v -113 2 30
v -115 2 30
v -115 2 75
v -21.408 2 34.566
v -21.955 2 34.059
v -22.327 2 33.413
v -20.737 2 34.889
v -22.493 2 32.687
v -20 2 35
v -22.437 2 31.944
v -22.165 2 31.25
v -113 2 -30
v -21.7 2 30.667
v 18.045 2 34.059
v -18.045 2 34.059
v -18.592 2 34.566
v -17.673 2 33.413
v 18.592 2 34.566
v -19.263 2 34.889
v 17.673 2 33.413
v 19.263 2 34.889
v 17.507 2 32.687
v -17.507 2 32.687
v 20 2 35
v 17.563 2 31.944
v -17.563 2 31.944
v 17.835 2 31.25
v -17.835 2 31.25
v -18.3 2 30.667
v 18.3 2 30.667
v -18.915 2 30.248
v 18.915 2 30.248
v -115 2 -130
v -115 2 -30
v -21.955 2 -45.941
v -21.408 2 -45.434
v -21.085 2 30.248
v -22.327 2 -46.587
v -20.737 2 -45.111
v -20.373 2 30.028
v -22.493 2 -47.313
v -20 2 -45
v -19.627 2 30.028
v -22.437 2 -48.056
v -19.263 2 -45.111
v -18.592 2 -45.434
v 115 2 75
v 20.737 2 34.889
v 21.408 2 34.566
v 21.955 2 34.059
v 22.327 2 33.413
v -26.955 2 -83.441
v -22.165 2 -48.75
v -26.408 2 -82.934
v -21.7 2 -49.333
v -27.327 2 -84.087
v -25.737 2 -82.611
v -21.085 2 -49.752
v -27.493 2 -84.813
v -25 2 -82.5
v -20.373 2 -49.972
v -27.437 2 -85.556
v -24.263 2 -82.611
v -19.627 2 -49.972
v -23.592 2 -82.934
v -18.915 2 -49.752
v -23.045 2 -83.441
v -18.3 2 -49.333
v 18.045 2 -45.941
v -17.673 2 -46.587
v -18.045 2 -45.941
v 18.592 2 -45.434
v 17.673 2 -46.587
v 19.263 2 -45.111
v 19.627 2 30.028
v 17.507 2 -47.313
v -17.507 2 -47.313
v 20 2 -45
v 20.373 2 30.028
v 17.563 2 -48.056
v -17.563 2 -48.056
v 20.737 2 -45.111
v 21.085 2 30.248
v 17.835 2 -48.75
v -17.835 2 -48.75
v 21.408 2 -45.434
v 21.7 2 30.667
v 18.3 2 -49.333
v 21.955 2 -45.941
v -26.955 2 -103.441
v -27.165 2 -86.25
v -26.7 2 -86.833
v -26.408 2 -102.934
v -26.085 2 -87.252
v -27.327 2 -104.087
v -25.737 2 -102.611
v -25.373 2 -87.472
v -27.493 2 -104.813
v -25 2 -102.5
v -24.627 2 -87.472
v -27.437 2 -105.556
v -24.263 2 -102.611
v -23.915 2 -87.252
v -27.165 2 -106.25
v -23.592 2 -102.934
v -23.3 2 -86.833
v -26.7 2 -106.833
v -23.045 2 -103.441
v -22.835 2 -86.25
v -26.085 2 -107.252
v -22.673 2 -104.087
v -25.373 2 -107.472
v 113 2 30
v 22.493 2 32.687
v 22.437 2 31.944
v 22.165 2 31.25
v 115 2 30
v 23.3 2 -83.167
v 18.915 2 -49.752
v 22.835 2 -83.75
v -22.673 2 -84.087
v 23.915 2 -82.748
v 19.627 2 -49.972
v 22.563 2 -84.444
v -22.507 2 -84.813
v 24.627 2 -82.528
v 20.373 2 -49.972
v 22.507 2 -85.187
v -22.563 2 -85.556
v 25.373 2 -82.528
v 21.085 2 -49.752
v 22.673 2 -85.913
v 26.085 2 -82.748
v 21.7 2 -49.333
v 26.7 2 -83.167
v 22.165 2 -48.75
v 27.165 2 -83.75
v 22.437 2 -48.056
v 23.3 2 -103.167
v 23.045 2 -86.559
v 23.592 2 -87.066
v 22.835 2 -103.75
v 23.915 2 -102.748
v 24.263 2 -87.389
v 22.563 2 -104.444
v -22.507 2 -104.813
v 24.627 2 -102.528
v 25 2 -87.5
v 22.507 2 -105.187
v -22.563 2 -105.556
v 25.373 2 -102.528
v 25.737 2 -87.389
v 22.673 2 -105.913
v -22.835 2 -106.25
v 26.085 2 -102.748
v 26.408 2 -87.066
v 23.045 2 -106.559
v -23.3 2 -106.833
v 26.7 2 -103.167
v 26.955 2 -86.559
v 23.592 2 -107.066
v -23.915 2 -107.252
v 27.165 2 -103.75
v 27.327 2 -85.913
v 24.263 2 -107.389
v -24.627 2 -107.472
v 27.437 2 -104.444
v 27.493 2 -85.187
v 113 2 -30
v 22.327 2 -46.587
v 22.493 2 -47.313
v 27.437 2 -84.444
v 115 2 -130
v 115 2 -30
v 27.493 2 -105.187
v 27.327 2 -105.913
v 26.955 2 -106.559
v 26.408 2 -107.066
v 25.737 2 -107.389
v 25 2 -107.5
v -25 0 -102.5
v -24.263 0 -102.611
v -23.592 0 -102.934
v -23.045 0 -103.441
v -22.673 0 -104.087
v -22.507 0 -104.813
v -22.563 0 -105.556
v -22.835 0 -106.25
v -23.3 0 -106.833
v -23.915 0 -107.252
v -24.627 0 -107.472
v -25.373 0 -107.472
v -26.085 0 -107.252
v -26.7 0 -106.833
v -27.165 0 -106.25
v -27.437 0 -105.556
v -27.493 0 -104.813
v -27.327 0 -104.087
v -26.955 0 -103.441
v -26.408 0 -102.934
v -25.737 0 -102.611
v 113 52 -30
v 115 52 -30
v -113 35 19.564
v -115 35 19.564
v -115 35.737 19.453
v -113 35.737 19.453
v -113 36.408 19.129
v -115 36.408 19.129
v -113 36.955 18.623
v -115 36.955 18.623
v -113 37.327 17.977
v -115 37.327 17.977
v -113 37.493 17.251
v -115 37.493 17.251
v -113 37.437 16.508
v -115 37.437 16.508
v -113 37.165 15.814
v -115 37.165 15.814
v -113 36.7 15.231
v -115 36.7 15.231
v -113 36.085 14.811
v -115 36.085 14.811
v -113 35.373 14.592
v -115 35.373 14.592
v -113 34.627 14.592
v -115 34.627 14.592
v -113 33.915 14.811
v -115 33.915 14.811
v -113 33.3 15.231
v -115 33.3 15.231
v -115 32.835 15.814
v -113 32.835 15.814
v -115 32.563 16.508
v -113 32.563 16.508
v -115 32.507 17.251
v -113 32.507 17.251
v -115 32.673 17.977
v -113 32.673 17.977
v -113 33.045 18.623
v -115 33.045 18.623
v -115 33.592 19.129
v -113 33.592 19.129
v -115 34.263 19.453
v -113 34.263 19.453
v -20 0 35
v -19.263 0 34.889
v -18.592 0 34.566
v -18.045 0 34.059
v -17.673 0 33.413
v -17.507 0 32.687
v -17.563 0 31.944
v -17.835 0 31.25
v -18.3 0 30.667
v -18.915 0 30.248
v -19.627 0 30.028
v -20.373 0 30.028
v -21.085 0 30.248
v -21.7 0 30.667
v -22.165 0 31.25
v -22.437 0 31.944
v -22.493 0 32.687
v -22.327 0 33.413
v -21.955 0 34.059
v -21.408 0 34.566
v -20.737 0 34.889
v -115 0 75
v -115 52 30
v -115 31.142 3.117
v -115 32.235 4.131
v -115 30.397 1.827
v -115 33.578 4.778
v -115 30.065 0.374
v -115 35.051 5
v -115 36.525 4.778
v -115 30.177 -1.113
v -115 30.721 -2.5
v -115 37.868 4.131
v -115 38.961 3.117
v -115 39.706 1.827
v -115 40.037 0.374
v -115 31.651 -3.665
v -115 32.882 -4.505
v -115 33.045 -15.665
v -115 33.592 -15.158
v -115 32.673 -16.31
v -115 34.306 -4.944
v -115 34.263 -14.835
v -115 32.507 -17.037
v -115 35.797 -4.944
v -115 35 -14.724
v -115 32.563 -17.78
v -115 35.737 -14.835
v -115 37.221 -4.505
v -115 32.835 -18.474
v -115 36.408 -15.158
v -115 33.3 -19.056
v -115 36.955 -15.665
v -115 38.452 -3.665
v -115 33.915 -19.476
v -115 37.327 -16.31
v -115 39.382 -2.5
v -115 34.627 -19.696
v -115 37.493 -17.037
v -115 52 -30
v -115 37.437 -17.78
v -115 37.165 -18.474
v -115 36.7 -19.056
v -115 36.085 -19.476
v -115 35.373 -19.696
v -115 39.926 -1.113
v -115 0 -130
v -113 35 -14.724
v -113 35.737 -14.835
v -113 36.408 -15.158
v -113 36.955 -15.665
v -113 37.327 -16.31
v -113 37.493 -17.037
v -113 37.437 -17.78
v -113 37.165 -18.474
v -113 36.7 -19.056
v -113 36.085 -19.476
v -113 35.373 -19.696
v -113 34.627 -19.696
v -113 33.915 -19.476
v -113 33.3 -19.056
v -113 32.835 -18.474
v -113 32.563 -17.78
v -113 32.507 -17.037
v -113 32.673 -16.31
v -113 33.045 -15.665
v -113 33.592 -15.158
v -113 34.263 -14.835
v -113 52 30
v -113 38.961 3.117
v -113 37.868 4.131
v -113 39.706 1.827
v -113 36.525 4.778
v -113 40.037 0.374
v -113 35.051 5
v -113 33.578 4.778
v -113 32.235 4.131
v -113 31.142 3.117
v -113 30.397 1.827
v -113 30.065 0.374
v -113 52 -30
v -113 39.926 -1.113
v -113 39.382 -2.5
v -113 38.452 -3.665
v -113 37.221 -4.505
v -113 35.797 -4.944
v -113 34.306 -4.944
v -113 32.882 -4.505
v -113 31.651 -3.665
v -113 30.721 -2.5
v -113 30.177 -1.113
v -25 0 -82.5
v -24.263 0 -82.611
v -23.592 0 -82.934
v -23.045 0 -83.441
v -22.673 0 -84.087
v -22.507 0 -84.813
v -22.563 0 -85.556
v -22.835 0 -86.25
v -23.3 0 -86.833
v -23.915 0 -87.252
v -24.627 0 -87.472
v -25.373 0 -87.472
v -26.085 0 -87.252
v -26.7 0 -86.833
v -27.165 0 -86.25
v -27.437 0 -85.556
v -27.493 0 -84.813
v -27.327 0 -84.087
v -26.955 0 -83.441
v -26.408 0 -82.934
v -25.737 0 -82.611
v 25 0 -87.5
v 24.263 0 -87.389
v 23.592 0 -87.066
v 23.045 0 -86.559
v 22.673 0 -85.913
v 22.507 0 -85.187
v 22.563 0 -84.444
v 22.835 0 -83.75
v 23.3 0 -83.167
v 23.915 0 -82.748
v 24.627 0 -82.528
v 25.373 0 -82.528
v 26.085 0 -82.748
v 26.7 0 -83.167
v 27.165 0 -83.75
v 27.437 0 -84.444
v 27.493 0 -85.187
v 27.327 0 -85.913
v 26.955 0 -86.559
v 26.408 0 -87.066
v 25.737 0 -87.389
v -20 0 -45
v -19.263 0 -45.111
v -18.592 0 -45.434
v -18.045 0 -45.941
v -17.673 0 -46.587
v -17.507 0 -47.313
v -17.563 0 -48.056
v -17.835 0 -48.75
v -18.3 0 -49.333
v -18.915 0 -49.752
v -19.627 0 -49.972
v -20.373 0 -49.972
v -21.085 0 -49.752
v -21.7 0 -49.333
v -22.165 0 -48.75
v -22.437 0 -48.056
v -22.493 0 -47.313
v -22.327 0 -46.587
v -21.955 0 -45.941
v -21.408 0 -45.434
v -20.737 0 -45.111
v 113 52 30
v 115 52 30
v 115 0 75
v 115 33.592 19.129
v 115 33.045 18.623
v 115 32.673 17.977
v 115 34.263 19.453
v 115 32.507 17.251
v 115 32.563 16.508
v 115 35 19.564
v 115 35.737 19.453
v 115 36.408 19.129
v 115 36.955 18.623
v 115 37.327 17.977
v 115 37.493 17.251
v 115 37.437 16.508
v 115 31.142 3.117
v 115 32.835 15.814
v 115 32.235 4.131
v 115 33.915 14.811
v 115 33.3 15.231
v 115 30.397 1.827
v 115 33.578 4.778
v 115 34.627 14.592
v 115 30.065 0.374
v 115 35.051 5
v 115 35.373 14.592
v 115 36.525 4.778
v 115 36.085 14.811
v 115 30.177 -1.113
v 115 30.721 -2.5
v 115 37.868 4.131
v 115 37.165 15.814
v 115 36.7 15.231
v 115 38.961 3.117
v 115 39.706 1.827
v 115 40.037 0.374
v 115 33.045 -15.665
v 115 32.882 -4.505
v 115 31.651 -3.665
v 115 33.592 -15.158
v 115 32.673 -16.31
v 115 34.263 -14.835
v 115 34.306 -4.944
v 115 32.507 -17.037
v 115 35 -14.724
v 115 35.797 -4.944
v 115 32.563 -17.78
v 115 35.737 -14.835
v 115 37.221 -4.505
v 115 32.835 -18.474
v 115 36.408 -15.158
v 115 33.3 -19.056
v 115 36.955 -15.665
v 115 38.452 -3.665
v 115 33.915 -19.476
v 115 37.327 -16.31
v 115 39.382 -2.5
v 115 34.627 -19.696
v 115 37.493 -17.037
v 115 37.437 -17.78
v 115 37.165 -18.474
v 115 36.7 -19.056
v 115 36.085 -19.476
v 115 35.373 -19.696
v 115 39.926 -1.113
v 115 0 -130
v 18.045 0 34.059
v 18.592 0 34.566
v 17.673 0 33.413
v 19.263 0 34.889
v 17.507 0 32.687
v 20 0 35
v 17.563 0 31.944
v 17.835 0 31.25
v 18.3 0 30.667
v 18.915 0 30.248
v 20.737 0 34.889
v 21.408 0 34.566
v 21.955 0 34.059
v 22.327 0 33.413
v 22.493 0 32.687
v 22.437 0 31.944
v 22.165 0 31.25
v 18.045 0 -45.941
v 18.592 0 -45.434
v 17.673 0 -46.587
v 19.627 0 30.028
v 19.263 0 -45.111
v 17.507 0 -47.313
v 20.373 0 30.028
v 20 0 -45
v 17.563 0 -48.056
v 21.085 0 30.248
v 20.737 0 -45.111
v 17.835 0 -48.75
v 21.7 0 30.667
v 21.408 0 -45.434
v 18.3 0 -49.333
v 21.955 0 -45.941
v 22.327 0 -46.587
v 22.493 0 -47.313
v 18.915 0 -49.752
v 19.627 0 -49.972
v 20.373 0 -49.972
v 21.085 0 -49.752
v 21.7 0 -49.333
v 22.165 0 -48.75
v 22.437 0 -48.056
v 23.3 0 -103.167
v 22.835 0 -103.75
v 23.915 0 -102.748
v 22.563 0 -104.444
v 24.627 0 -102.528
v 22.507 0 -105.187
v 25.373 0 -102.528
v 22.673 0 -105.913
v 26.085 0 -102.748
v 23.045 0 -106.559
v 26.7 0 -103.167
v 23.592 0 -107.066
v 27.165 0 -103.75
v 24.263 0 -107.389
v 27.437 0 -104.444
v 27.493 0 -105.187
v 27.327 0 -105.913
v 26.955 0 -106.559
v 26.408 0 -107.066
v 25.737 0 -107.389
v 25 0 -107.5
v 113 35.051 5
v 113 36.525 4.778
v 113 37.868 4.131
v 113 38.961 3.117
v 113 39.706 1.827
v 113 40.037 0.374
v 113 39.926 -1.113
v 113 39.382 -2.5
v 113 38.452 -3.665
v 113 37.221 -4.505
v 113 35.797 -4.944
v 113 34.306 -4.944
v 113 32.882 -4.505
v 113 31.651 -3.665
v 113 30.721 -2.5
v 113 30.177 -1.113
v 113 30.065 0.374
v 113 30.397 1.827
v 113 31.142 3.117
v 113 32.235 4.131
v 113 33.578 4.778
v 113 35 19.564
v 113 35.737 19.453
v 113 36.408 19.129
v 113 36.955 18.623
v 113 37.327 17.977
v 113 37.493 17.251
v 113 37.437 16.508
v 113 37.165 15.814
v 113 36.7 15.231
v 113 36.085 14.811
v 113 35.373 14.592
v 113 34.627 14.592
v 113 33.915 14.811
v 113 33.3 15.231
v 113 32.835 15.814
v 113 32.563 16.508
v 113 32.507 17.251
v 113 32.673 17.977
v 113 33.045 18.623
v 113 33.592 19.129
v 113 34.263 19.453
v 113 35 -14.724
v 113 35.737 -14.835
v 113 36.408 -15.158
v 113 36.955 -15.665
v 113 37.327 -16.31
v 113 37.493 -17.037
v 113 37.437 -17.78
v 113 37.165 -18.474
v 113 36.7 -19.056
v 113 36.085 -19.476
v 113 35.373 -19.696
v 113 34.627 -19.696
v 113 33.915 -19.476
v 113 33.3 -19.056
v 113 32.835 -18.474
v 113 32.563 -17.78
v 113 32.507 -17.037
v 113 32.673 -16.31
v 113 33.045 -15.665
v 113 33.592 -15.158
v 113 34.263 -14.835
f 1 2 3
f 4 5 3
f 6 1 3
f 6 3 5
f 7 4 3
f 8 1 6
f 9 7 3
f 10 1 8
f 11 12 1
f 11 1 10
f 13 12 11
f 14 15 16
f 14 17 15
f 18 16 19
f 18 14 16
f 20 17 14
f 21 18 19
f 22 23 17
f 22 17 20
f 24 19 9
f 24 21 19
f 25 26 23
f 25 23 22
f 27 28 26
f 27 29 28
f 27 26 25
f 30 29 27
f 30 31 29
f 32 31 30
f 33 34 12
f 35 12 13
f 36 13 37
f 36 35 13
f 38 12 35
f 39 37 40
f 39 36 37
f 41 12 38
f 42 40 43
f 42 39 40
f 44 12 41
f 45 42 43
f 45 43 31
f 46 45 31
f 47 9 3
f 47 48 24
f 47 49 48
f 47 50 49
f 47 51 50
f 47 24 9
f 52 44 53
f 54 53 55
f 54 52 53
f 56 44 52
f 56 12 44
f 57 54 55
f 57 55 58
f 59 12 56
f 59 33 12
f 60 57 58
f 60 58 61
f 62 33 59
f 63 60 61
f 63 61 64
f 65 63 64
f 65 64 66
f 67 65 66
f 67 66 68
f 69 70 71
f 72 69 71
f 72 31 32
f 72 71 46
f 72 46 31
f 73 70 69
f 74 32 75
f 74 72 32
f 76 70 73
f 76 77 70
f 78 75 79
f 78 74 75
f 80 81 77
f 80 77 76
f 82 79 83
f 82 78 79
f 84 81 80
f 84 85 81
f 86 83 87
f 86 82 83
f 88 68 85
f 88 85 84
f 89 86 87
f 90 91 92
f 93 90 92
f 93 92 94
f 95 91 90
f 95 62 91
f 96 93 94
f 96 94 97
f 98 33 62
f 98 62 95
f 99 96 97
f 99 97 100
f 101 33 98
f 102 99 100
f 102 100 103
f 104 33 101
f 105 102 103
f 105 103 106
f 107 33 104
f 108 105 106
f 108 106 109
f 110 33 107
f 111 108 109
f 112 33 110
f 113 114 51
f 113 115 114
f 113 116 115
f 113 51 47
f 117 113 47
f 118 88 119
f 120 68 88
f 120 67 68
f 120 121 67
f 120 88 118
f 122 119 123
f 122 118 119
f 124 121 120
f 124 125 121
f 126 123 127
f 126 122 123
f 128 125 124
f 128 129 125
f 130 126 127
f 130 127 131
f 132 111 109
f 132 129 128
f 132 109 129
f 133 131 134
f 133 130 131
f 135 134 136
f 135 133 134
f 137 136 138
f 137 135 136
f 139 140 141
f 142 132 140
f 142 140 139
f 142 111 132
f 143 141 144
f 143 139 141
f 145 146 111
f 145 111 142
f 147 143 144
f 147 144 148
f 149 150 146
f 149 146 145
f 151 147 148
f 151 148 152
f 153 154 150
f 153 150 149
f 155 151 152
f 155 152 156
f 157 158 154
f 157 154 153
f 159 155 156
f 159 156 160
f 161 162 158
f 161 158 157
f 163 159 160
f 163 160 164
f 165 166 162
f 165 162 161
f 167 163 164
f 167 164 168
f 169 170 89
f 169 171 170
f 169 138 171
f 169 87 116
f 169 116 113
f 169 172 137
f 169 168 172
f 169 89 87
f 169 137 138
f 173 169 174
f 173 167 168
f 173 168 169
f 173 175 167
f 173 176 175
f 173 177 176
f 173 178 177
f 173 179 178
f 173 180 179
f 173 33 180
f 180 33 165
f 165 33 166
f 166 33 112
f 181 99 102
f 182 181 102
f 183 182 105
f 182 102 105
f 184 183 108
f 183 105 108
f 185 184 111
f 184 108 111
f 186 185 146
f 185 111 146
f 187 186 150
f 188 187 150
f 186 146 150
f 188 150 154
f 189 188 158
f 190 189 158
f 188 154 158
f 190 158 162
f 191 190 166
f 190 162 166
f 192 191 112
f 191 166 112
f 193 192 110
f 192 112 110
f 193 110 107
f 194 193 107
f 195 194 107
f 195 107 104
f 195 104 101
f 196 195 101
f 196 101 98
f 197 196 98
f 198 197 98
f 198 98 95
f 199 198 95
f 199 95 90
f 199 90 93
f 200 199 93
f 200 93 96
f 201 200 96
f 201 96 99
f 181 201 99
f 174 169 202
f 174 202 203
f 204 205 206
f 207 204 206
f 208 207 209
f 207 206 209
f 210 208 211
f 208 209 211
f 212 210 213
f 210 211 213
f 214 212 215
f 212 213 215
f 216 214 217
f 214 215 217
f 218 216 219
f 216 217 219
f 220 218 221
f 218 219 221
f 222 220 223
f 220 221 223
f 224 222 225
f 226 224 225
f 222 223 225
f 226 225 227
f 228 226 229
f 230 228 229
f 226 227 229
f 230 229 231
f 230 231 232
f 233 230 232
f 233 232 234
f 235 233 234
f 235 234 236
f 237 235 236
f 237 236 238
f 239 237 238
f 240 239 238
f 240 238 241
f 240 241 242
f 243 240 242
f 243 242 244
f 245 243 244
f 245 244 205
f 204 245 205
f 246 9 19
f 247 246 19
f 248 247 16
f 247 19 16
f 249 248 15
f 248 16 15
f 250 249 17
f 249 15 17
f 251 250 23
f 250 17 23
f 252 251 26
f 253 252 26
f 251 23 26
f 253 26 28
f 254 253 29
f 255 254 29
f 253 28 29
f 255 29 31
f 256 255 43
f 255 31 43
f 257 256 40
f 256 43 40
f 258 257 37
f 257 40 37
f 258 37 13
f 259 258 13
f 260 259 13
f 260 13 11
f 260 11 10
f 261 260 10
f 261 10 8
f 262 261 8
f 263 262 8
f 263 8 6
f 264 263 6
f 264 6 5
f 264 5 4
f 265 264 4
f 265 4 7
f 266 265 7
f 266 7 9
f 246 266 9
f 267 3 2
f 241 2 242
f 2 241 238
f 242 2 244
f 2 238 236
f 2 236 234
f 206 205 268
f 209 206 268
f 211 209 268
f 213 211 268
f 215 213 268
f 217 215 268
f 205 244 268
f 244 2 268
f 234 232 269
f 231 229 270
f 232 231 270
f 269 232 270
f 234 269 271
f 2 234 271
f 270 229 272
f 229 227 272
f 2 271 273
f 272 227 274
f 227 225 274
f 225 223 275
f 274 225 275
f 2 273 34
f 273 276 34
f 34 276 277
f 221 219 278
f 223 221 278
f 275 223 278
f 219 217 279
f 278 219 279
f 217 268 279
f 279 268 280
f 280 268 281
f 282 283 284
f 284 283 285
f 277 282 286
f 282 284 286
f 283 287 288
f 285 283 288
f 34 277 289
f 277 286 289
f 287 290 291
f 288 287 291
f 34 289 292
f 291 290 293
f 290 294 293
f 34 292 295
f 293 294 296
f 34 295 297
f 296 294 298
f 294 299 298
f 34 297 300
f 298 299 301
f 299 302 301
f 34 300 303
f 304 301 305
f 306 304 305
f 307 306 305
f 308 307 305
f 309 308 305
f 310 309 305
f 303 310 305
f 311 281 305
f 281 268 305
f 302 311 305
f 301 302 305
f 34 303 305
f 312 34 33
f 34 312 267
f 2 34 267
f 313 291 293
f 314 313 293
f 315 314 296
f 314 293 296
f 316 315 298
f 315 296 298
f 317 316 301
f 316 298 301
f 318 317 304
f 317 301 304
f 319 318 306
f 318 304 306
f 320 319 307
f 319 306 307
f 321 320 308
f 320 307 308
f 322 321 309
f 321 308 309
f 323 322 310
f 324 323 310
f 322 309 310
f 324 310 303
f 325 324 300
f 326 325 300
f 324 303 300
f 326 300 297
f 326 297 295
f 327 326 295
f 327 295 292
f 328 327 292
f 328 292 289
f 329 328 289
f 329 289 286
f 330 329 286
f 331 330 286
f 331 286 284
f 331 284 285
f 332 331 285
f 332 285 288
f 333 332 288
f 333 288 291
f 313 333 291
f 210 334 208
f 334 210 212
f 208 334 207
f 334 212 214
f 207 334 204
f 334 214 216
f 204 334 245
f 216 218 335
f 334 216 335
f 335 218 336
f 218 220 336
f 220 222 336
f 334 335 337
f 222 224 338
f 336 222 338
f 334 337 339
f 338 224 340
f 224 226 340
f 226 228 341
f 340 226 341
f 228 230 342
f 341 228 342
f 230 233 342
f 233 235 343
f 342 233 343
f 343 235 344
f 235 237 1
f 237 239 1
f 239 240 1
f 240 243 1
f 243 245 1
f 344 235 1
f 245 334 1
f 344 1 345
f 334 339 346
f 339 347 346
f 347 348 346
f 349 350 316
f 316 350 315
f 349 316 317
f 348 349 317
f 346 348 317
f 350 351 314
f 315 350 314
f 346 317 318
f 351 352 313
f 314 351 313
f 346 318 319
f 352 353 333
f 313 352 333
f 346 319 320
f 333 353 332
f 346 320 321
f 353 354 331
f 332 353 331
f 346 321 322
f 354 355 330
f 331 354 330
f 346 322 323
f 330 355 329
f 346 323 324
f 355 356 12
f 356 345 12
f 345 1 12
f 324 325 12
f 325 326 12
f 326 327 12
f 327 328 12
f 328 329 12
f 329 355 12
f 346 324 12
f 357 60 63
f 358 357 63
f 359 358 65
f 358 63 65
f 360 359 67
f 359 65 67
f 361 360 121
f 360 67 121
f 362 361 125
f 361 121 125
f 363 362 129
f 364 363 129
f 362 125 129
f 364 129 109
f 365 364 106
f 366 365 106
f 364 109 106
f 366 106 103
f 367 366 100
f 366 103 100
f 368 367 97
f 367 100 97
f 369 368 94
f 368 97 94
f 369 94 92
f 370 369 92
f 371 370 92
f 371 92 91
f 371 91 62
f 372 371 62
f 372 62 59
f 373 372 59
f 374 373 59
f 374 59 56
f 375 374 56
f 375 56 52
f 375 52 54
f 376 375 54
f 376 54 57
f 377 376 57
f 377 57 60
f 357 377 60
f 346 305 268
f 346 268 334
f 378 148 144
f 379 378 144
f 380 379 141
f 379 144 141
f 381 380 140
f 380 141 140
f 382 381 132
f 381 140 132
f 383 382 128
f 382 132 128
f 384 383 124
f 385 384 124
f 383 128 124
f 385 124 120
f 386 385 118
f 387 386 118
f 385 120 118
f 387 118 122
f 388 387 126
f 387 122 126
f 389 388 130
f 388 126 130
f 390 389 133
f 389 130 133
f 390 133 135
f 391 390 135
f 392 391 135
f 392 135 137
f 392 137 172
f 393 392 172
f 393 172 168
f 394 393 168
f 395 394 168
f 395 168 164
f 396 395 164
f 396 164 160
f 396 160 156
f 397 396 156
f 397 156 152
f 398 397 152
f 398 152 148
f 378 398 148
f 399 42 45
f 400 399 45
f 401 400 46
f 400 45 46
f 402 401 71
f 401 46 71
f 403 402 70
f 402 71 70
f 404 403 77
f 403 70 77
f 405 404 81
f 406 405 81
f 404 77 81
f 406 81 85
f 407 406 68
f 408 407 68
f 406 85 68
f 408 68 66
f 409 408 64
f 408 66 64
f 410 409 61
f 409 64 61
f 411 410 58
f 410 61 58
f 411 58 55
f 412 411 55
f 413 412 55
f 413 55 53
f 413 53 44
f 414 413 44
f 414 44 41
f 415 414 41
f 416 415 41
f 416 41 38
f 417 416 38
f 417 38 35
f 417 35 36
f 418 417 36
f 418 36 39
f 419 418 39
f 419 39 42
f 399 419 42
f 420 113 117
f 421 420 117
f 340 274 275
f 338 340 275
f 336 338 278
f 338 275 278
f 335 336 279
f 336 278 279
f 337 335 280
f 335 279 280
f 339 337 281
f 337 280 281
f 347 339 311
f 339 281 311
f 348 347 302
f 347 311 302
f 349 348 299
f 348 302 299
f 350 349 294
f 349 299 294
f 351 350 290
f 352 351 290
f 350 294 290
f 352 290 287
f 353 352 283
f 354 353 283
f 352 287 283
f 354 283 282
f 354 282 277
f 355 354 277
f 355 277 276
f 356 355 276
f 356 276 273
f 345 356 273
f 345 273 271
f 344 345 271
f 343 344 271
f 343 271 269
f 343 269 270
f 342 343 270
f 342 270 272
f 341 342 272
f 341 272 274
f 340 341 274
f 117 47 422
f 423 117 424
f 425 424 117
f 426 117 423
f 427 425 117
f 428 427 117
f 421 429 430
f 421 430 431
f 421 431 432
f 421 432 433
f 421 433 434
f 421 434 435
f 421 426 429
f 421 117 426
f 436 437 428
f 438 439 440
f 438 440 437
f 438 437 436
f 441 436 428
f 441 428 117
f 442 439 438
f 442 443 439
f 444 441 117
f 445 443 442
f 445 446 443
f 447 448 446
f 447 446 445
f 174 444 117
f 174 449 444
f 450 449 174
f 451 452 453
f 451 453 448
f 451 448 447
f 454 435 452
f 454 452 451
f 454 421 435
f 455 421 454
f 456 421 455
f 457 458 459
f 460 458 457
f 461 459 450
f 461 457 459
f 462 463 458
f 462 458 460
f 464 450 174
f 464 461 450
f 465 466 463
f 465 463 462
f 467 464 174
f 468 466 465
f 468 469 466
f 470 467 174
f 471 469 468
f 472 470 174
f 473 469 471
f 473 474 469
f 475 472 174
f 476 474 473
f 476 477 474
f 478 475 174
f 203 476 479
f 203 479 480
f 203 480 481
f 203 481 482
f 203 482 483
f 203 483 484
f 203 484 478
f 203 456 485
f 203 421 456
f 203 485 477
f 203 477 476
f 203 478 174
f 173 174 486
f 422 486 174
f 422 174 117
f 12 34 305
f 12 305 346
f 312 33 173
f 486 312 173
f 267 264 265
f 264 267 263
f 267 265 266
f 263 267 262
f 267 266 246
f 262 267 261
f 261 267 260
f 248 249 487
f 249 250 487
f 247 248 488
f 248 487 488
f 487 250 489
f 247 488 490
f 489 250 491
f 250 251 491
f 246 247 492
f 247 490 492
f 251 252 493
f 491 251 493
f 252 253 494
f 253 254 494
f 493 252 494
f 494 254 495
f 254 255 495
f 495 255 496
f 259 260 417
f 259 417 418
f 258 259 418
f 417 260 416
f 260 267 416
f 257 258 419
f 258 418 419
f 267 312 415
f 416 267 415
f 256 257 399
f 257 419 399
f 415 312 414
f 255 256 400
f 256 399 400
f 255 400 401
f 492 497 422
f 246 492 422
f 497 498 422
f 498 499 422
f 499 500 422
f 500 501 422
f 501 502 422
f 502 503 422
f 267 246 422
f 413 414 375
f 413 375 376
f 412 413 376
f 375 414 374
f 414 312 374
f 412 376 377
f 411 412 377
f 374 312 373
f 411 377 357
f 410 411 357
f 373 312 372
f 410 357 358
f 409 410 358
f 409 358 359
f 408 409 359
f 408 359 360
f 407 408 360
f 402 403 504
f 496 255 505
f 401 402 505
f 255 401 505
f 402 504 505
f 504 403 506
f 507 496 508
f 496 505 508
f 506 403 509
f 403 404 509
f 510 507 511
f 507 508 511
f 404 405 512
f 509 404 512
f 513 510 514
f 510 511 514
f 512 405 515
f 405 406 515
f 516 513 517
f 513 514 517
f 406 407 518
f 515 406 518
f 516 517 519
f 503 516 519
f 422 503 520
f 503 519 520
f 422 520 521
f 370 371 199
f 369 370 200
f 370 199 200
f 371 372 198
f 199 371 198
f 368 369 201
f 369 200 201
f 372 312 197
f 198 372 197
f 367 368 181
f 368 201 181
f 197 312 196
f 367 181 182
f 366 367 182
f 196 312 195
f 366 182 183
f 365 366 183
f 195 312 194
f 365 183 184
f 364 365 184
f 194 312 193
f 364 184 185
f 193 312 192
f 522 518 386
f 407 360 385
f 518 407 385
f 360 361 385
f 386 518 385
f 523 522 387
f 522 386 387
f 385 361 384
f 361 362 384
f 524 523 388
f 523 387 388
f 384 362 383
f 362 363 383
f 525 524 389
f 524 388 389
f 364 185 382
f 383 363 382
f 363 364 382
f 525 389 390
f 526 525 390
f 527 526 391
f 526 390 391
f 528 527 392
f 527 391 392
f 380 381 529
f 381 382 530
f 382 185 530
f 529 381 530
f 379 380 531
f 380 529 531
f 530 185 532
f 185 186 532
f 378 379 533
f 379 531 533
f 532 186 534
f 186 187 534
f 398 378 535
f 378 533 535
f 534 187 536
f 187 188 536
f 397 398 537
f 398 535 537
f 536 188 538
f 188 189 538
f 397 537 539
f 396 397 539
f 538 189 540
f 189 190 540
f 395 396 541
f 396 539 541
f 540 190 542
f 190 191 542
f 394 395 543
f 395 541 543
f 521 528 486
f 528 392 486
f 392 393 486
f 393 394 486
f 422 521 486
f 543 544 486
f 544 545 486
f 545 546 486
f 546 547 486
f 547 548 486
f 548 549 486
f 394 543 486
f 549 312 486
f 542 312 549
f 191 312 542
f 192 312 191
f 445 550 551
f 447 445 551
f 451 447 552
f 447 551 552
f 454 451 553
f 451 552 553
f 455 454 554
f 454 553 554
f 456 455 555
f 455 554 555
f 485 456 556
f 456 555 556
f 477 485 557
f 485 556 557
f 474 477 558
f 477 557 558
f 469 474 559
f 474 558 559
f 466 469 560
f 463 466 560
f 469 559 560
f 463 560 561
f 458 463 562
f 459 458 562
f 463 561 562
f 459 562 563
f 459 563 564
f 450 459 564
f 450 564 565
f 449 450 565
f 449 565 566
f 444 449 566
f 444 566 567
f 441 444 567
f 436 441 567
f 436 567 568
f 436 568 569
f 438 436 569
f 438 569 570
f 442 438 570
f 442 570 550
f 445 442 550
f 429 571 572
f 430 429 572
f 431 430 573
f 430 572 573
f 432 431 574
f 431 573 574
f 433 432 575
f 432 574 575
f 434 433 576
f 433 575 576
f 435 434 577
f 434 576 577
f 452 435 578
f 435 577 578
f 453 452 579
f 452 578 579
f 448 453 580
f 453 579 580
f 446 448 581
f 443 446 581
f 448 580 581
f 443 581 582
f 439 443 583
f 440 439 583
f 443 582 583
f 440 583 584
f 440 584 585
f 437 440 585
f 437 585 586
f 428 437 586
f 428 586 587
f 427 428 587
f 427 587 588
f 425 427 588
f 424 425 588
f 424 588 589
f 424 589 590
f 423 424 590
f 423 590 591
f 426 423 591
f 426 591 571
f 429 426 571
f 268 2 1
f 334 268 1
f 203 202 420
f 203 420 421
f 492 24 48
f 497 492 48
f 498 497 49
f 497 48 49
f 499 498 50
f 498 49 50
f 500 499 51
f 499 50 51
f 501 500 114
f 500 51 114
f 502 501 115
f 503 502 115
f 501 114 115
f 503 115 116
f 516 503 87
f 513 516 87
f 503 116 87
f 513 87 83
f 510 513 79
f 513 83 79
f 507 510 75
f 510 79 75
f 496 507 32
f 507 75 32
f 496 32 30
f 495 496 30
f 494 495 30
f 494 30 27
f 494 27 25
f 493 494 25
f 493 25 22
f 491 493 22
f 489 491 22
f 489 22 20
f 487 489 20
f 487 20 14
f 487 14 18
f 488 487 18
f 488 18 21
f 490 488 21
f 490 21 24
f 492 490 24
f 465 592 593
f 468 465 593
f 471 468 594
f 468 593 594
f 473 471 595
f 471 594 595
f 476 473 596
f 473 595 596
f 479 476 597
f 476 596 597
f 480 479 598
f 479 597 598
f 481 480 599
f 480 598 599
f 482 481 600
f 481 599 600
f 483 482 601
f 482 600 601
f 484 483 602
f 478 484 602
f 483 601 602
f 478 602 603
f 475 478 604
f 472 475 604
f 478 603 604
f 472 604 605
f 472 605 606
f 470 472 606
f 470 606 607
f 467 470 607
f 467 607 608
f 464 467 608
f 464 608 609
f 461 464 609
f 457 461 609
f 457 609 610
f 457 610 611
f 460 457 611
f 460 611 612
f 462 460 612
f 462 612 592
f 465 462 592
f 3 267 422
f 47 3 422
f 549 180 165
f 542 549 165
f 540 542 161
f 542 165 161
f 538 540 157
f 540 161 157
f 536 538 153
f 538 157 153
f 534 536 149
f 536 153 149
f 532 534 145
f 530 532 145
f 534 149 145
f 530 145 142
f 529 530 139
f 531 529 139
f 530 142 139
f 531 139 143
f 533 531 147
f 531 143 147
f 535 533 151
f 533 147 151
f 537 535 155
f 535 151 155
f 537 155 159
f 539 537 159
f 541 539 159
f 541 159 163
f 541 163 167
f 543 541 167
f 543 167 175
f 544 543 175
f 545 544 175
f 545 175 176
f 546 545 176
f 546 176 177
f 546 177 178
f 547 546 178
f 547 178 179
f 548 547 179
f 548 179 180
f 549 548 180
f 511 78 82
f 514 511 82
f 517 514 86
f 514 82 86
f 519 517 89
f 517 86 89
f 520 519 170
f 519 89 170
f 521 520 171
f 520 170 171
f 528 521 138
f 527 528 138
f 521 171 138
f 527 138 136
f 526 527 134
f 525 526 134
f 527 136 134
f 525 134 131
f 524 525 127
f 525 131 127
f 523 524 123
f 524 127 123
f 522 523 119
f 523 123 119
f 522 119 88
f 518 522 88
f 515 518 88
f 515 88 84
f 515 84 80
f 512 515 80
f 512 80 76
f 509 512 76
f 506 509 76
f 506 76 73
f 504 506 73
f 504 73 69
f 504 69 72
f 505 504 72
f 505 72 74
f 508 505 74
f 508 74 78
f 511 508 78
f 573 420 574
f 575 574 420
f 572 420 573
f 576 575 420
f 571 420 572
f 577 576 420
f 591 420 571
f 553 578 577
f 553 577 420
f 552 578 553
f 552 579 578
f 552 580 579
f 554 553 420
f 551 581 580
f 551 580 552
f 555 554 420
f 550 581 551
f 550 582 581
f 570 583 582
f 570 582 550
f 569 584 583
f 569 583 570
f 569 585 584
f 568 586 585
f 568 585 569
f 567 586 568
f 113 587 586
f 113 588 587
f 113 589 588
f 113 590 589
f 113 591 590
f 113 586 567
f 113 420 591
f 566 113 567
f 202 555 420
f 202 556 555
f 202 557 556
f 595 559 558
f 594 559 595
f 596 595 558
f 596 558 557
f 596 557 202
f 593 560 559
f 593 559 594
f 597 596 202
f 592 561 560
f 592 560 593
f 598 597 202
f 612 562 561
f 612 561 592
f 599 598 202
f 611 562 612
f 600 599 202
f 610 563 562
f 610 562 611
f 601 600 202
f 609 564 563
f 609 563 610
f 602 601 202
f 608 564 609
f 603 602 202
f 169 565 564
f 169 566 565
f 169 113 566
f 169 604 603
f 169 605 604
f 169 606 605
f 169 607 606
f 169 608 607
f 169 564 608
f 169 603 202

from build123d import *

# Parameters (mm, degrees)
BOSS_EXTRUDE1_DEPTH = 2
SKETCH2_W           = 2
SKETCH2_H           = 60
BOSS_EXTRUDE2_DEPTH = 50
SKETCH6_R           = 2.5
CUT_EXTRUDE3_DEPTH  = 20
SKETCH8_R           = 2.5
CUT_EXTRUDE5_DEPTH  = 10
SKETCH9_W           = 230
SKETCH9_H           = 50
BOSS_EXTRUDE3_DEPTH = 2
SKETCH10_R          = 2.5
CUT_EXTRUDE6_DEPTH  = 16
SKETCH12_R          = 5
CUT_EXTRUDE7_DEPTH  = 242
SKETCH15_R          = 2.5
CUT_EXTRUDE8_DEPTH  = 242


with BuildPart() as part:
    # Sketch1 → Boss-Extrude1 (new body)
    with BuildSketch(Plane(origin=(0, 0, 0), x_dir=(1, 0, 0), z_dir=(0, 1, 0))):
        Polygon((115, 50), (115, 80), (-115, 80), (-115, 50), (-115, -50), (-115, -75), (115, -75), (115, -50), align=None)
    extrude(amount=BOSS_EXTRUDE1_DEPTH)

    # Sketch2 → Boss-Extrude2 (add)
    with BuildSketch(Plane(origin=(0, 2, 0), x_dir=(1, 0, 0), z_dir=(0, 1, 0))):
        with Locations((-114, 0)):
            Rectangle(SKETCH2_W, SKETCH2_H)
        with Locations((114, 0)):
            Rectangle(SKETCH2_W, SKETCH2_H)
    extrude(amount=BOSS_EXTRUDE2_DEPTH)

    # Sketch6 → Cut-Extrude3 (cut)
    with BuildSketch(Plane(origin=(0, 2, 0), x_dir=(1, 0, 0), z_dir=(0, 1, 0))):
        with Locations(Location((-20, 47.5, 0), (0, 0, 270))):
            Circle(SKETCH6_R)
        with Locations(Location((20, 47.5, 0), (0, 0, 270))):
            Circle(SKETCH6_R)
    extrude(amount=-CUT_EXTRUDE3_DEPTH, mode=Mode.SUBTRACT)

    # Sketch8 → Cut-Extrude5 (cut)
    with BuildSketch(Plane(origin=(0, 2, 0), x_dir=(1, 0, 0), z_dir=(0, 1, 0))):
        with Locations(Location((-20, -32.5, 0), (0, 0, 270))):
            Circle(SKETCH8_R)
        with Locations(Location((20, -32.5, 0), (0, 0, 270))):
            Circle(SKETCH8_R)
    extrude(amount=-CUT_EXTRUDE5_DEPTH, mode=Mode.SUBTRACT)

    # Sketch9 → Boss-Extrude3 (add)
    with BuildSketch(Plane(origin=(0, 2, 0), x_dir=(1, 0, 0), z_dir=(0, 1, 0))):
        with Locations((0, 105)):
            Rectangle(SKETCH9_W, SKETCH9_H)
    extrude(amount=-BOSS_EXTRUDE3_DEPTH)

    # Sketch10 → Cut-Extrude6 (cut)
    with BuildSketch(Plane(origin=(0, 2, 0), x_dir=(1, 0, 0), z_dir=(0, 1, 0))):
        with Locations(Location((-25, 85, 0), (0, 0, 270))):
            Circle(SKETCH10_R)
        with Locations(Location((-25, 105, 0), (0, 0, 270))):
            Circle(SKETCH10_R)
        with Locations(Location((25, 105, 0), (0, 0, 90))):
            Circle(SKETCH10_R)
        with Locations(Location((25, 85, 0), (0, 0, 90))):
            Circle(SKETCH10_R)
    extrude(amount=-CUT_EXTRUDE6_DEPTH, mode=Mode.SUBTRACT)

    # Sketch12 → Cut-Extrude7 (cut)
    with BuildSketch(Plane.ZY.offset(115)):
        with Locations((0, 35.05138551)):
            Circle(SKETCH12_R)
    extrude(amount=-CUT_EXTRUDE7_DEPTH, mode=Mode.SUBTRACT)

    # Sketch15 → Cut-Extrude8 (cut)
    with BuildSketch(Plane.ZY.offset(115)):
        with Locations((-17.223737456, 35)):
            Circle(SKETCH15_R)
        with Locations((17.063876513, 35)):
            Circle(SKETCH15_R)
    extrude(amount=-CUT_EXTRUDE8_DEPTH, mode=Mode.SUBTRACT)


solid = part.part
